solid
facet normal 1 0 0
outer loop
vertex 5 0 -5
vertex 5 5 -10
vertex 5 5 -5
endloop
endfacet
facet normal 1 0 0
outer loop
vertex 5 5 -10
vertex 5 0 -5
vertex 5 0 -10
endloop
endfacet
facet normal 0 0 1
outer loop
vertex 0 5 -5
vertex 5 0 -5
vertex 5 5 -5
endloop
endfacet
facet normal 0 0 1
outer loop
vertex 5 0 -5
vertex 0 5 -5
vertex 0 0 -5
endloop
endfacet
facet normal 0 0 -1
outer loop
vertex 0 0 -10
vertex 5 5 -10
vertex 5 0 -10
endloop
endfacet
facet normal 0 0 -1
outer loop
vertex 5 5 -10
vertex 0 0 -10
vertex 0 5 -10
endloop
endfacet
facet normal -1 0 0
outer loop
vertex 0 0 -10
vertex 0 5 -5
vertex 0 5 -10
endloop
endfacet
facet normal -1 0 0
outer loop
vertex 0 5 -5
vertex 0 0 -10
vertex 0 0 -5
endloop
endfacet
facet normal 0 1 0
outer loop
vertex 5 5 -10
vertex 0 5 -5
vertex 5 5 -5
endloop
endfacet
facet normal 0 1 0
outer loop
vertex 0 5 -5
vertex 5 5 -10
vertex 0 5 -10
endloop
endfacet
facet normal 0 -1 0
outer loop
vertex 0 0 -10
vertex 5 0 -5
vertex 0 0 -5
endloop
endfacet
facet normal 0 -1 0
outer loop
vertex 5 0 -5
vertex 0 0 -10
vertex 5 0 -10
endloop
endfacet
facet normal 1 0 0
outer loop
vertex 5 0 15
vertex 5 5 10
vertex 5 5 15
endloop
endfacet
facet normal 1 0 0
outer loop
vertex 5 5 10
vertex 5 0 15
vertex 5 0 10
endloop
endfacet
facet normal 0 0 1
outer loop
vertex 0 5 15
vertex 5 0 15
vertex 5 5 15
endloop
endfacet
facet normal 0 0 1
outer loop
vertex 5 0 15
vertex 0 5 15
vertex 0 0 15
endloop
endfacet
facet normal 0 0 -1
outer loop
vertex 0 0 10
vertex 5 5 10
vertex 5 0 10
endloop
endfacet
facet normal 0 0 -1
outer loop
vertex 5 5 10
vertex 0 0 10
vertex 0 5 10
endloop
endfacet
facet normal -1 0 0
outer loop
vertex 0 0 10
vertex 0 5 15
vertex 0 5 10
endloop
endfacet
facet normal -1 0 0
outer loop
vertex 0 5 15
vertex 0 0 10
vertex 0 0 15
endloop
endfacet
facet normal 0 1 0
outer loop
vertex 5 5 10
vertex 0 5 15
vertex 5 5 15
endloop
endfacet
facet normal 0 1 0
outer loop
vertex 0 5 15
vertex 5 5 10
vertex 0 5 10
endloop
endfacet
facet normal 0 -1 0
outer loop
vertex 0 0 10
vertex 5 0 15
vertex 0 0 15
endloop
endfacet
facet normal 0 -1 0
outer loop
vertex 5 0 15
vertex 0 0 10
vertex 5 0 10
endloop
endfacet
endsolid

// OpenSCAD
for (z = [-10, 10]) {
	translate([0, 0, z])
	cube(size=5, center=false);
}
